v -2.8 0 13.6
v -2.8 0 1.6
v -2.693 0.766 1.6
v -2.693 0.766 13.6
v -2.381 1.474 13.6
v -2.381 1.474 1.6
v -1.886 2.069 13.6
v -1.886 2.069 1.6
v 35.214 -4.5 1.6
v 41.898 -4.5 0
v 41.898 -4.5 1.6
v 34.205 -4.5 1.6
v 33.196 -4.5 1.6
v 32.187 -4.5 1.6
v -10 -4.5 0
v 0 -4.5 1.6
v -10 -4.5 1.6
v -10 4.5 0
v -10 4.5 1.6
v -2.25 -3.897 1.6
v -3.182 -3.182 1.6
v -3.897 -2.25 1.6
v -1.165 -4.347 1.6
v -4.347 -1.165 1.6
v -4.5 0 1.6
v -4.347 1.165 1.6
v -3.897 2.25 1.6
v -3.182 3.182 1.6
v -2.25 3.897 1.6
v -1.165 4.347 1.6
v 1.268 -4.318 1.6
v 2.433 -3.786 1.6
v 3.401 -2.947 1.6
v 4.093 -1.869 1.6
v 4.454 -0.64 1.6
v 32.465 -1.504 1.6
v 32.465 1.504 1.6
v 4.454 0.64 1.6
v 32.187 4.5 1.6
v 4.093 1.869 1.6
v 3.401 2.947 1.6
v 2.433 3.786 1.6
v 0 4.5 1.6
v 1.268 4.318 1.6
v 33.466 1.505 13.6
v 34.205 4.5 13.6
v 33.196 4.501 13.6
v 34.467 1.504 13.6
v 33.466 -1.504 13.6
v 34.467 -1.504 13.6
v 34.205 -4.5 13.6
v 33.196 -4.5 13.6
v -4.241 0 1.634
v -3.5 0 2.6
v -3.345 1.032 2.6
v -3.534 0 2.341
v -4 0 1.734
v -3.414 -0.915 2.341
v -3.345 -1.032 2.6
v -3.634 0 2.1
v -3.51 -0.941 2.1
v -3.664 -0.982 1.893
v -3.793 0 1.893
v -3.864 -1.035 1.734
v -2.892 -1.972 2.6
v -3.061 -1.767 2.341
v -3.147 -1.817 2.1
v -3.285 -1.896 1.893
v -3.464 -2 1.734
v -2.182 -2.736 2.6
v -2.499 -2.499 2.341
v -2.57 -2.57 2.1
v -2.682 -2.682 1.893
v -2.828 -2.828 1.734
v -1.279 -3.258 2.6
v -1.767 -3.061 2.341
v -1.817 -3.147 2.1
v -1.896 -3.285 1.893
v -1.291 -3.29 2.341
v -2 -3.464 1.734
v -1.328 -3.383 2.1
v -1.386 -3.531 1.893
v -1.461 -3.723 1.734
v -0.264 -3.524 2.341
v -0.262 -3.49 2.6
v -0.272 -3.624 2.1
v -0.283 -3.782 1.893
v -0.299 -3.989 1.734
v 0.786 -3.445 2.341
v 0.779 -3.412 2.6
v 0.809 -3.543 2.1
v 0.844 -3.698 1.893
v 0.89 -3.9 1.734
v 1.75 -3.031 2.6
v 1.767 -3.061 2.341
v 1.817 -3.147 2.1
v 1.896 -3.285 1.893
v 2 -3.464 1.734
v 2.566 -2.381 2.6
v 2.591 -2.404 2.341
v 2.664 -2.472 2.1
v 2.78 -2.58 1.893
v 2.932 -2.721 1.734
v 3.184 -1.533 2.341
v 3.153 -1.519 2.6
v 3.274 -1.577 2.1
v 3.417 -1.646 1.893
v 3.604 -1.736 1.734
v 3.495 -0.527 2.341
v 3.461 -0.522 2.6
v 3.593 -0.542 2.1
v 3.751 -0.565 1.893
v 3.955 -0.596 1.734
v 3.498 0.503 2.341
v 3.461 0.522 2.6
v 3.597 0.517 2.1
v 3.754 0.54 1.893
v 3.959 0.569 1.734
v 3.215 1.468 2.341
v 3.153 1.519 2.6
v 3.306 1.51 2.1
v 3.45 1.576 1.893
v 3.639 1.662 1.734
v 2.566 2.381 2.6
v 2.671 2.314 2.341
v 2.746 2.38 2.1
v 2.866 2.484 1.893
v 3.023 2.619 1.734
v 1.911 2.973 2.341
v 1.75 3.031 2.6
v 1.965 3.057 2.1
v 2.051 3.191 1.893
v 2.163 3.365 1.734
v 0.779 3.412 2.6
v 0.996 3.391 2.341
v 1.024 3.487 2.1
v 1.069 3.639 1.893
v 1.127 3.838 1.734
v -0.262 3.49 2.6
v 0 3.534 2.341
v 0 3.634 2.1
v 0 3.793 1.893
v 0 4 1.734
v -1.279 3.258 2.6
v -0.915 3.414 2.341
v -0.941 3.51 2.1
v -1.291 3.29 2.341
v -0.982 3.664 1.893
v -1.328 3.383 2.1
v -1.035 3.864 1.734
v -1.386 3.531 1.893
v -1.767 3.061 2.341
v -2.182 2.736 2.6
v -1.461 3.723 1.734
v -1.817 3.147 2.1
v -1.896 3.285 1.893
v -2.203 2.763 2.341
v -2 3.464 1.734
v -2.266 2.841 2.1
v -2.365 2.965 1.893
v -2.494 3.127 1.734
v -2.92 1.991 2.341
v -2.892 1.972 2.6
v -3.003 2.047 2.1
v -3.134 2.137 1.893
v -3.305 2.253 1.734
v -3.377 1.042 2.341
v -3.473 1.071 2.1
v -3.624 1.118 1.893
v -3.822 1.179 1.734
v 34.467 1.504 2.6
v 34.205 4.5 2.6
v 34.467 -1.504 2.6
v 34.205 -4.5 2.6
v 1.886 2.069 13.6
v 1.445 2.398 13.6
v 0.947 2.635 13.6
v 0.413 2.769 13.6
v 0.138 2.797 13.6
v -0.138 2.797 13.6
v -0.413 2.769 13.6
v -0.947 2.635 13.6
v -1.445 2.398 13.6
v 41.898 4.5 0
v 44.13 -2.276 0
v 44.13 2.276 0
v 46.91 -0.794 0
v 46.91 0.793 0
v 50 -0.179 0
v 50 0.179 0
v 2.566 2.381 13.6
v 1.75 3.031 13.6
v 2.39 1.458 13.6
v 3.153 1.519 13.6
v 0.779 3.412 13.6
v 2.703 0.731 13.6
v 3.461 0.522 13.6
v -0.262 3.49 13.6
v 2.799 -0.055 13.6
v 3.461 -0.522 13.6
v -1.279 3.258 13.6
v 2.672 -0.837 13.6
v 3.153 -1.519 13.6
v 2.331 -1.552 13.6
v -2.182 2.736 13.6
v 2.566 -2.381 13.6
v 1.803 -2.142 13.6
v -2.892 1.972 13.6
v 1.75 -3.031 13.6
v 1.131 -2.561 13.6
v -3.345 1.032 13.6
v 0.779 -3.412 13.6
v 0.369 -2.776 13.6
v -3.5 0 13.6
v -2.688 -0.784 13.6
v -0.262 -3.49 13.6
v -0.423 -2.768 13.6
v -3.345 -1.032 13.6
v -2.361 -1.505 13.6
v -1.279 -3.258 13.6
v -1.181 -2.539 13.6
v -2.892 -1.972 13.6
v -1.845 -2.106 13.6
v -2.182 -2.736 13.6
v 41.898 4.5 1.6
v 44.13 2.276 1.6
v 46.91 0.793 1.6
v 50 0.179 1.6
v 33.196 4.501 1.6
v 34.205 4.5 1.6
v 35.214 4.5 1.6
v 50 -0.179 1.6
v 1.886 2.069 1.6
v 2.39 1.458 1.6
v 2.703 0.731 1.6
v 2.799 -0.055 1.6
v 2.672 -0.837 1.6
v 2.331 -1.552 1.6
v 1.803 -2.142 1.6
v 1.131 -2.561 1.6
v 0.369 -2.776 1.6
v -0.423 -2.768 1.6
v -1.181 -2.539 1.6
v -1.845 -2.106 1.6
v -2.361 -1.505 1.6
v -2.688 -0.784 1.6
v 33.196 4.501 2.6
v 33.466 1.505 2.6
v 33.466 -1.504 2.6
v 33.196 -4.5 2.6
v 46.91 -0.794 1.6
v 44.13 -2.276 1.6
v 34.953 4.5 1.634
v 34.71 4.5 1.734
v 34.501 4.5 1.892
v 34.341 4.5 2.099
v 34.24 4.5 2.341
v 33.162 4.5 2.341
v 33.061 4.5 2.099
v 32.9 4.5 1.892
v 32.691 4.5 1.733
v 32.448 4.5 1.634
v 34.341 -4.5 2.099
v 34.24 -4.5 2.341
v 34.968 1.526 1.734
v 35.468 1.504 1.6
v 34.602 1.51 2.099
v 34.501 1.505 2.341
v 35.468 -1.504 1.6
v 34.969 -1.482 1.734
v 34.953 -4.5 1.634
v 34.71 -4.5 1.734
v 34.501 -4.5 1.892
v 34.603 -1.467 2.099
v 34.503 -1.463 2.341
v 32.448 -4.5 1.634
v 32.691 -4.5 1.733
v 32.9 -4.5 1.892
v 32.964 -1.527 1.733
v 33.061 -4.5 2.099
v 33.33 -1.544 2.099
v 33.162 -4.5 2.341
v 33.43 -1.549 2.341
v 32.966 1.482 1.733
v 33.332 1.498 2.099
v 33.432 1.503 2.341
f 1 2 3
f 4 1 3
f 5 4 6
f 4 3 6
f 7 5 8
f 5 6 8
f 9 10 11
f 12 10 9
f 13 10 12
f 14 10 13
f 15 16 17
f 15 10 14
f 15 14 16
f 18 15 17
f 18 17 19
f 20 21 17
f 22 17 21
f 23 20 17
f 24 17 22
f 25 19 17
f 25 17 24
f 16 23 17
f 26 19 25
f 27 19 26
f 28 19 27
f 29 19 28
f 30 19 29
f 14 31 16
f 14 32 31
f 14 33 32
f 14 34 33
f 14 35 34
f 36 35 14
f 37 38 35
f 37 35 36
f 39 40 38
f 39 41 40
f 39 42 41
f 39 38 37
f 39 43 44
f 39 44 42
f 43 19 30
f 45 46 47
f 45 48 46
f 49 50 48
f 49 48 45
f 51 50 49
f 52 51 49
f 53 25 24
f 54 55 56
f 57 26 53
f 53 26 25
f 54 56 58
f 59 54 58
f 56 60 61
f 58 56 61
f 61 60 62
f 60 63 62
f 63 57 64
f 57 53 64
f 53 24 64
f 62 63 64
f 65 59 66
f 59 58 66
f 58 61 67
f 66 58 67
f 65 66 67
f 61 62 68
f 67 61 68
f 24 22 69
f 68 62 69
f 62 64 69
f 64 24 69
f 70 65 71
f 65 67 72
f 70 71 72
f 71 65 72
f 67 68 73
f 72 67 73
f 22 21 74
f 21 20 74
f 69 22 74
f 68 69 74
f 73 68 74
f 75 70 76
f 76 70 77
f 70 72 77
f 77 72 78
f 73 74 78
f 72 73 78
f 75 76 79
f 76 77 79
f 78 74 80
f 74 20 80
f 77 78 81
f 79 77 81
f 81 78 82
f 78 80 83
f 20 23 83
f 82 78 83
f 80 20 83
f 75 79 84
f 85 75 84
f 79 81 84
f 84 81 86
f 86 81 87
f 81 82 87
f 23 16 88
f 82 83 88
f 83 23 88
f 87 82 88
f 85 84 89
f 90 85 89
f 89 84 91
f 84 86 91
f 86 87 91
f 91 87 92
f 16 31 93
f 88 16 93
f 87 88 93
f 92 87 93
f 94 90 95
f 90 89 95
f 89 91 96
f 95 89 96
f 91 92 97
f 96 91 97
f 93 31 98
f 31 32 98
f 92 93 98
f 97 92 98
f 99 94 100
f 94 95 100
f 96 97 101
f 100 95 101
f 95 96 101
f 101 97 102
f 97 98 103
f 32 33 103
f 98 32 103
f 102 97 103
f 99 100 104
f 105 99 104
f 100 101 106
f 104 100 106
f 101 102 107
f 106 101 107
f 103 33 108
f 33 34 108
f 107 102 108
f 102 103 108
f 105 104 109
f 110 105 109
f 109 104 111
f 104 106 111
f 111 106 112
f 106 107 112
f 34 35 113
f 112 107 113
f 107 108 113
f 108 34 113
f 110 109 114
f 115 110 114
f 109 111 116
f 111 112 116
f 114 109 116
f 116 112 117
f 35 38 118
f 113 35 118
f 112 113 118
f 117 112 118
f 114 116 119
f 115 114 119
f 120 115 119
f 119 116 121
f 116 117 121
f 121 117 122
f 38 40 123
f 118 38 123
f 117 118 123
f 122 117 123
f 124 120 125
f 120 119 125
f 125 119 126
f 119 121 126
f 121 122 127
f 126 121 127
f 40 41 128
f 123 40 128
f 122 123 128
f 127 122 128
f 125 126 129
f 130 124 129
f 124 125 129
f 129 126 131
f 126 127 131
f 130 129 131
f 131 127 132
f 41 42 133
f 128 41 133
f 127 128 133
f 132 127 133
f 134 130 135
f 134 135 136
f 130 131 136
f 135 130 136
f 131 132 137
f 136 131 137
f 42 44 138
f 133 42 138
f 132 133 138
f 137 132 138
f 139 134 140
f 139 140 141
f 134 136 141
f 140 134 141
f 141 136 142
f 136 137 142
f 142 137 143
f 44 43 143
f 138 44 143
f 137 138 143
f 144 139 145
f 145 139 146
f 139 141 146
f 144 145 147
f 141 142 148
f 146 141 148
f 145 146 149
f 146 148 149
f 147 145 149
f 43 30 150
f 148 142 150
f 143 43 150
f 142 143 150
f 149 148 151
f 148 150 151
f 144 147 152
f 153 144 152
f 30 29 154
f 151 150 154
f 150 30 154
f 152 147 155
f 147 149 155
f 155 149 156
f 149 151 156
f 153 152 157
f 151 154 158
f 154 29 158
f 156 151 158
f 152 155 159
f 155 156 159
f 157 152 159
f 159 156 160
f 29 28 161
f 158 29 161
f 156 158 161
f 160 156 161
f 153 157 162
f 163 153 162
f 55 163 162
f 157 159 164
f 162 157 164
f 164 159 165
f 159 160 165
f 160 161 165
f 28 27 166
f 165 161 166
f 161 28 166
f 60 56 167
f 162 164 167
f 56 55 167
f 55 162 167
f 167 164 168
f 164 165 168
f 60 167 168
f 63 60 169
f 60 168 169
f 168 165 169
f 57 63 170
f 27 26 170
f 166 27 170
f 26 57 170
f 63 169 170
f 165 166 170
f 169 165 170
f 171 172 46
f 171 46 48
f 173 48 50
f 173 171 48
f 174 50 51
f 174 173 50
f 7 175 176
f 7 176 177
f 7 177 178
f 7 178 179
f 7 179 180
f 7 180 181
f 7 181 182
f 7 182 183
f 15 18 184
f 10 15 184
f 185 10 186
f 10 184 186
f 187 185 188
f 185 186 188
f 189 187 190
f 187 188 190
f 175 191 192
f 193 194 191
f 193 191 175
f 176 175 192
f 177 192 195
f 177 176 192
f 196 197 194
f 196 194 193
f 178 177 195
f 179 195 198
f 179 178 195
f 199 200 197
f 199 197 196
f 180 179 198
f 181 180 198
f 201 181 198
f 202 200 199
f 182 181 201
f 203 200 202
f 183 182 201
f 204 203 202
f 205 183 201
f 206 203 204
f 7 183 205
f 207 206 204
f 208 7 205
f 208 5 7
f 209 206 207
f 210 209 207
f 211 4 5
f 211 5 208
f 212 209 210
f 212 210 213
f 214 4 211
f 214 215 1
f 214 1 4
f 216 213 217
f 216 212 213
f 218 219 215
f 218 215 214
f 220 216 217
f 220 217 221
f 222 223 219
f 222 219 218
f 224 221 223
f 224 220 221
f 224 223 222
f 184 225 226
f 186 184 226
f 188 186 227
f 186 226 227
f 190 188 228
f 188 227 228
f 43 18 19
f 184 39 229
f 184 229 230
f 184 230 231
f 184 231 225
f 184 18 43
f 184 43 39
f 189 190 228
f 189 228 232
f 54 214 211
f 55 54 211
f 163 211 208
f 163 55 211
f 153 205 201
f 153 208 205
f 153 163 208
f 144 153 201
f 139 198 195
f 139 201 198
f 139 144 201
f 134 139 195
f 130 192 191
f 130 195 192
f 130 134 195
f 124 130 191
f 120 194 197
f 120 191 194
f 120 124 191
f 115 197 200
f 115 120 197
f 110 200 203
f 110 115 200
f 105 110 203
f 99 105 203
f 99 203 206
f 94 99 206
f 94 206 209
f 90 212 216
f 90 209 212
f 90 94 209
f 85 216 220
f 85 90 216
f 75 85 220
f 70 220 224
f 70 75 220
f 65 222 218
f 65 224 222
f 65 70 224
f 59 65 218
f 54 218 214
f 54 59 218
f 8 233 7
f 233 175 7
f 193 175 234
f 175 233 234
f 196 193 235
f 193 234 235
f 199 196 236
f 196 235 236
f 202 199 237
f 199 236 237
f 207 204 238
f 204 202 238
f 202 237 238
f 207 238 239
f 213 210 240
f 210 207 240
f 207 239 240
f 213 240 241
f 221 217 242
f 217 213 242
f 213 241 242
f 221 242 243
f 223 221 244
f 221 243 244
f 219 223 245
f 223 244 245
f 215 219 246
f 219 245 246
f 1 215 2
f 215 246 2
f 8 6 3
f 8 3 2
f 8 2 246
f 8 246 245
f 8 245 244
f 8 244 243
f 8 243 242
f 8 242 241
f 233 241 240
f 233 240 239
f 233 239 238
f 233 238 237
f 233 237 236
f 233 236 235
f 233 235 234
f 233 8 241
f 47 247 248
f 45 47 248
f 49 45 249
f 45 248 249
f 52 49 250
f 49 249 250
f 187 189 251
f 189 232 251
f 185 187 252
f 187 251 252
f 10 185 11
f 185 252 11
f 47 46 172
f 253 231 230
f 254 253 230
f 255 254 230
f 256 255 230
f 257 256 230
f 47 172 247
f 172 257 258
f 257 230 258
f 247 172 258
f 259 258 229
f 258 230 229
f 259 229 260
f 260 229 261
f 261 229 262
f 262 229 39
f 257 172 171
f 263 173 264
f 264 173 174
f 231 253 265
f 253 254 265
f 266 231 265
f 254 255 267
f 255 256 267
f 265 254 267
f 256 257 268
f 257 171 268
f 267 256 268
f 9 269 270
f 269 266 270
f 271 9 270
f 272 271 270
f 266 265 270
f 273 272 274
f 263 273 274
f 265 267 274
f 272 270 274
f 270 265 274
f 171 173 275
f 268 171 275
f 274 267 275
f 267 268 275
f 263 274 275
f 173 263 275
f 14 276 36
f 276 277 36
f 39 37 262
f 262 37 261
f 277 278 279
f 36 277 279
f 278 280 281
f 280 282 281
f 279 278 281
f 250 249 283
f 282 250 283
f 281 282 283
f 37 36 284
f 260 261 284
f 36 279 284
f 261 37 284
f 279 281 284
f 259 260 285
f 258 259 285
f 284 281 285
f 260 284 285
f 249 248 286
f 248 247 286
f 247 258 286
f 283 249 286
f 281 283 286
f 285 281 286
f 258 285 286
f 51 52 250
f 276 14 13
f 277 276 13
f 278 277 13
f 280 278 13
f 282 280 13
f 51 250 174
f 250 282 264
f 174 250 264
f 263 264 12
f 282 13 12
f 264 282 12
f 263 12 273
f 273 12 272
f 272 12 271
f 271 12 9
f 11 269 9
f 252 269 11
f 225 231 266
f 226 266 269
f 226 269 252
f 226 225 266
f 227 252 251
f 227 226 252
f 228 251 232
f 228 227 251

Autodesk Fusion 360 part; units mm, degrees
sketch "Esquisse1" plane through (0, 0, 0) normal (0, 0, 1) x (1, 0, 0)
  line L0 (-10, 4.5) -> (50, 4.5)
  line L1 (50, 4.5) -> (50, -4.5)
  line L2 (50, -4.5) -> (-10, -4.5)
  line L3 (-10, -4.5) -> (-10, 4.5)
  dimension "d1" = 60
  dimension "d2" = 9
  dimension "d3" = 10
  dimension "d4" = 4.5
extrude "Extrusion1" add sketch "Esquisse1" along normal blind 1.6
sketch "Esquisse2" plane through (0, 0, 1.6) normal (0, 0, 1) x (-1, 0, 0)
  line L0 (10, 4.5) -> (-50, 4.5)
  line L1 (-50, 4.5) -> (-50, -4.5)
  line L2 (-50, -4.5) -> (10, -4.5)
  line L3 (10, -4.5) -> (10, 4.5)
  circle A0 centre (0, 0) radius 3.5
  arc A1 (-33.1964, 4.5) -> (-33.1963, -4.5007) centre (0, 0) ccw
  arc A2 (-34.2053, 4.5) -> (-34.2053, -4.5) centre (0, 0) ccw
  line L4 (-33.1963, -4.5007) -> (-34.2053, -4.5)
  line L5 (-33.1963, -4.5007) -> (-34.2053, -4.5)
  line L6 (-33.1964, 4.5) -> (-34.2053, 4.5)
  circle A3 centre (0, 0) radius 2.8
  dimension "d7" = 7
  dimension "d8" = 33.5
  dimension "d9" = 34.5
  dimension "d10" = 5.6
extrude "Extrusion2" add sketch "Esquisse2" along normal blind 12 contours L0 L2 A1 A2 L4 L5 L6
extrude "Extrusion3" add sketch "Esquisse2" along normal blind 12 contours A0
sketch "Esquisse3" plane through (0, 0, 13.6) normal (0, 0, 1) x (-1, 0, 0)
  circle A0 centre (0, 0) radius 2.8
  circle A1 centre (0, 0) radius 3.5
  line L0 (2.0235, -2.7693) -> (-1.9765, -2.7693)
  line L1 (-1.9765, -2.7693) -> (-1.9765, -2.0693)
  line L2 (-1.9765, -2.0693) -> (2.0235, -2.0693)
  line L3 (2.0235, -2.0693) -> (2.0235, -2.7693)
  dimension "d15" = 4
  dimension "d16" = 0.7
extrude "Extrusion4" add sketch "Esquisse3" against normal blind 12.2 contours A0 L0 L2 | A0 L0
sketch "Esquisse4" plane through (0, 0, 1.6) normal (0, 0, 1) x (-1, 0, 0)
  circle A0 centre (-50.5342, 10.9358) radius 10.7703
  circle A1 centre (-50.5342, -10.9358) radius 10.7705
  dimension "d19" = 21.5407
  dimension "d20" = 21.541
  dimension "d21" = 10.9358
  dimension "d22" = 10.9358
  dimension "d23" = 50.5342
  dimension "d24" = 50.5342
extrude "Extrusion5" cut sketch "Esquisse4" against normal blind 2
fillet "Congé1" radius 1 1 edges at (3.2631, -1.2657, 1.6)
fillet "Congé2" radius 1 2 edges at (33.5, 0, 1.6) (34.5, 0, 1.6)
